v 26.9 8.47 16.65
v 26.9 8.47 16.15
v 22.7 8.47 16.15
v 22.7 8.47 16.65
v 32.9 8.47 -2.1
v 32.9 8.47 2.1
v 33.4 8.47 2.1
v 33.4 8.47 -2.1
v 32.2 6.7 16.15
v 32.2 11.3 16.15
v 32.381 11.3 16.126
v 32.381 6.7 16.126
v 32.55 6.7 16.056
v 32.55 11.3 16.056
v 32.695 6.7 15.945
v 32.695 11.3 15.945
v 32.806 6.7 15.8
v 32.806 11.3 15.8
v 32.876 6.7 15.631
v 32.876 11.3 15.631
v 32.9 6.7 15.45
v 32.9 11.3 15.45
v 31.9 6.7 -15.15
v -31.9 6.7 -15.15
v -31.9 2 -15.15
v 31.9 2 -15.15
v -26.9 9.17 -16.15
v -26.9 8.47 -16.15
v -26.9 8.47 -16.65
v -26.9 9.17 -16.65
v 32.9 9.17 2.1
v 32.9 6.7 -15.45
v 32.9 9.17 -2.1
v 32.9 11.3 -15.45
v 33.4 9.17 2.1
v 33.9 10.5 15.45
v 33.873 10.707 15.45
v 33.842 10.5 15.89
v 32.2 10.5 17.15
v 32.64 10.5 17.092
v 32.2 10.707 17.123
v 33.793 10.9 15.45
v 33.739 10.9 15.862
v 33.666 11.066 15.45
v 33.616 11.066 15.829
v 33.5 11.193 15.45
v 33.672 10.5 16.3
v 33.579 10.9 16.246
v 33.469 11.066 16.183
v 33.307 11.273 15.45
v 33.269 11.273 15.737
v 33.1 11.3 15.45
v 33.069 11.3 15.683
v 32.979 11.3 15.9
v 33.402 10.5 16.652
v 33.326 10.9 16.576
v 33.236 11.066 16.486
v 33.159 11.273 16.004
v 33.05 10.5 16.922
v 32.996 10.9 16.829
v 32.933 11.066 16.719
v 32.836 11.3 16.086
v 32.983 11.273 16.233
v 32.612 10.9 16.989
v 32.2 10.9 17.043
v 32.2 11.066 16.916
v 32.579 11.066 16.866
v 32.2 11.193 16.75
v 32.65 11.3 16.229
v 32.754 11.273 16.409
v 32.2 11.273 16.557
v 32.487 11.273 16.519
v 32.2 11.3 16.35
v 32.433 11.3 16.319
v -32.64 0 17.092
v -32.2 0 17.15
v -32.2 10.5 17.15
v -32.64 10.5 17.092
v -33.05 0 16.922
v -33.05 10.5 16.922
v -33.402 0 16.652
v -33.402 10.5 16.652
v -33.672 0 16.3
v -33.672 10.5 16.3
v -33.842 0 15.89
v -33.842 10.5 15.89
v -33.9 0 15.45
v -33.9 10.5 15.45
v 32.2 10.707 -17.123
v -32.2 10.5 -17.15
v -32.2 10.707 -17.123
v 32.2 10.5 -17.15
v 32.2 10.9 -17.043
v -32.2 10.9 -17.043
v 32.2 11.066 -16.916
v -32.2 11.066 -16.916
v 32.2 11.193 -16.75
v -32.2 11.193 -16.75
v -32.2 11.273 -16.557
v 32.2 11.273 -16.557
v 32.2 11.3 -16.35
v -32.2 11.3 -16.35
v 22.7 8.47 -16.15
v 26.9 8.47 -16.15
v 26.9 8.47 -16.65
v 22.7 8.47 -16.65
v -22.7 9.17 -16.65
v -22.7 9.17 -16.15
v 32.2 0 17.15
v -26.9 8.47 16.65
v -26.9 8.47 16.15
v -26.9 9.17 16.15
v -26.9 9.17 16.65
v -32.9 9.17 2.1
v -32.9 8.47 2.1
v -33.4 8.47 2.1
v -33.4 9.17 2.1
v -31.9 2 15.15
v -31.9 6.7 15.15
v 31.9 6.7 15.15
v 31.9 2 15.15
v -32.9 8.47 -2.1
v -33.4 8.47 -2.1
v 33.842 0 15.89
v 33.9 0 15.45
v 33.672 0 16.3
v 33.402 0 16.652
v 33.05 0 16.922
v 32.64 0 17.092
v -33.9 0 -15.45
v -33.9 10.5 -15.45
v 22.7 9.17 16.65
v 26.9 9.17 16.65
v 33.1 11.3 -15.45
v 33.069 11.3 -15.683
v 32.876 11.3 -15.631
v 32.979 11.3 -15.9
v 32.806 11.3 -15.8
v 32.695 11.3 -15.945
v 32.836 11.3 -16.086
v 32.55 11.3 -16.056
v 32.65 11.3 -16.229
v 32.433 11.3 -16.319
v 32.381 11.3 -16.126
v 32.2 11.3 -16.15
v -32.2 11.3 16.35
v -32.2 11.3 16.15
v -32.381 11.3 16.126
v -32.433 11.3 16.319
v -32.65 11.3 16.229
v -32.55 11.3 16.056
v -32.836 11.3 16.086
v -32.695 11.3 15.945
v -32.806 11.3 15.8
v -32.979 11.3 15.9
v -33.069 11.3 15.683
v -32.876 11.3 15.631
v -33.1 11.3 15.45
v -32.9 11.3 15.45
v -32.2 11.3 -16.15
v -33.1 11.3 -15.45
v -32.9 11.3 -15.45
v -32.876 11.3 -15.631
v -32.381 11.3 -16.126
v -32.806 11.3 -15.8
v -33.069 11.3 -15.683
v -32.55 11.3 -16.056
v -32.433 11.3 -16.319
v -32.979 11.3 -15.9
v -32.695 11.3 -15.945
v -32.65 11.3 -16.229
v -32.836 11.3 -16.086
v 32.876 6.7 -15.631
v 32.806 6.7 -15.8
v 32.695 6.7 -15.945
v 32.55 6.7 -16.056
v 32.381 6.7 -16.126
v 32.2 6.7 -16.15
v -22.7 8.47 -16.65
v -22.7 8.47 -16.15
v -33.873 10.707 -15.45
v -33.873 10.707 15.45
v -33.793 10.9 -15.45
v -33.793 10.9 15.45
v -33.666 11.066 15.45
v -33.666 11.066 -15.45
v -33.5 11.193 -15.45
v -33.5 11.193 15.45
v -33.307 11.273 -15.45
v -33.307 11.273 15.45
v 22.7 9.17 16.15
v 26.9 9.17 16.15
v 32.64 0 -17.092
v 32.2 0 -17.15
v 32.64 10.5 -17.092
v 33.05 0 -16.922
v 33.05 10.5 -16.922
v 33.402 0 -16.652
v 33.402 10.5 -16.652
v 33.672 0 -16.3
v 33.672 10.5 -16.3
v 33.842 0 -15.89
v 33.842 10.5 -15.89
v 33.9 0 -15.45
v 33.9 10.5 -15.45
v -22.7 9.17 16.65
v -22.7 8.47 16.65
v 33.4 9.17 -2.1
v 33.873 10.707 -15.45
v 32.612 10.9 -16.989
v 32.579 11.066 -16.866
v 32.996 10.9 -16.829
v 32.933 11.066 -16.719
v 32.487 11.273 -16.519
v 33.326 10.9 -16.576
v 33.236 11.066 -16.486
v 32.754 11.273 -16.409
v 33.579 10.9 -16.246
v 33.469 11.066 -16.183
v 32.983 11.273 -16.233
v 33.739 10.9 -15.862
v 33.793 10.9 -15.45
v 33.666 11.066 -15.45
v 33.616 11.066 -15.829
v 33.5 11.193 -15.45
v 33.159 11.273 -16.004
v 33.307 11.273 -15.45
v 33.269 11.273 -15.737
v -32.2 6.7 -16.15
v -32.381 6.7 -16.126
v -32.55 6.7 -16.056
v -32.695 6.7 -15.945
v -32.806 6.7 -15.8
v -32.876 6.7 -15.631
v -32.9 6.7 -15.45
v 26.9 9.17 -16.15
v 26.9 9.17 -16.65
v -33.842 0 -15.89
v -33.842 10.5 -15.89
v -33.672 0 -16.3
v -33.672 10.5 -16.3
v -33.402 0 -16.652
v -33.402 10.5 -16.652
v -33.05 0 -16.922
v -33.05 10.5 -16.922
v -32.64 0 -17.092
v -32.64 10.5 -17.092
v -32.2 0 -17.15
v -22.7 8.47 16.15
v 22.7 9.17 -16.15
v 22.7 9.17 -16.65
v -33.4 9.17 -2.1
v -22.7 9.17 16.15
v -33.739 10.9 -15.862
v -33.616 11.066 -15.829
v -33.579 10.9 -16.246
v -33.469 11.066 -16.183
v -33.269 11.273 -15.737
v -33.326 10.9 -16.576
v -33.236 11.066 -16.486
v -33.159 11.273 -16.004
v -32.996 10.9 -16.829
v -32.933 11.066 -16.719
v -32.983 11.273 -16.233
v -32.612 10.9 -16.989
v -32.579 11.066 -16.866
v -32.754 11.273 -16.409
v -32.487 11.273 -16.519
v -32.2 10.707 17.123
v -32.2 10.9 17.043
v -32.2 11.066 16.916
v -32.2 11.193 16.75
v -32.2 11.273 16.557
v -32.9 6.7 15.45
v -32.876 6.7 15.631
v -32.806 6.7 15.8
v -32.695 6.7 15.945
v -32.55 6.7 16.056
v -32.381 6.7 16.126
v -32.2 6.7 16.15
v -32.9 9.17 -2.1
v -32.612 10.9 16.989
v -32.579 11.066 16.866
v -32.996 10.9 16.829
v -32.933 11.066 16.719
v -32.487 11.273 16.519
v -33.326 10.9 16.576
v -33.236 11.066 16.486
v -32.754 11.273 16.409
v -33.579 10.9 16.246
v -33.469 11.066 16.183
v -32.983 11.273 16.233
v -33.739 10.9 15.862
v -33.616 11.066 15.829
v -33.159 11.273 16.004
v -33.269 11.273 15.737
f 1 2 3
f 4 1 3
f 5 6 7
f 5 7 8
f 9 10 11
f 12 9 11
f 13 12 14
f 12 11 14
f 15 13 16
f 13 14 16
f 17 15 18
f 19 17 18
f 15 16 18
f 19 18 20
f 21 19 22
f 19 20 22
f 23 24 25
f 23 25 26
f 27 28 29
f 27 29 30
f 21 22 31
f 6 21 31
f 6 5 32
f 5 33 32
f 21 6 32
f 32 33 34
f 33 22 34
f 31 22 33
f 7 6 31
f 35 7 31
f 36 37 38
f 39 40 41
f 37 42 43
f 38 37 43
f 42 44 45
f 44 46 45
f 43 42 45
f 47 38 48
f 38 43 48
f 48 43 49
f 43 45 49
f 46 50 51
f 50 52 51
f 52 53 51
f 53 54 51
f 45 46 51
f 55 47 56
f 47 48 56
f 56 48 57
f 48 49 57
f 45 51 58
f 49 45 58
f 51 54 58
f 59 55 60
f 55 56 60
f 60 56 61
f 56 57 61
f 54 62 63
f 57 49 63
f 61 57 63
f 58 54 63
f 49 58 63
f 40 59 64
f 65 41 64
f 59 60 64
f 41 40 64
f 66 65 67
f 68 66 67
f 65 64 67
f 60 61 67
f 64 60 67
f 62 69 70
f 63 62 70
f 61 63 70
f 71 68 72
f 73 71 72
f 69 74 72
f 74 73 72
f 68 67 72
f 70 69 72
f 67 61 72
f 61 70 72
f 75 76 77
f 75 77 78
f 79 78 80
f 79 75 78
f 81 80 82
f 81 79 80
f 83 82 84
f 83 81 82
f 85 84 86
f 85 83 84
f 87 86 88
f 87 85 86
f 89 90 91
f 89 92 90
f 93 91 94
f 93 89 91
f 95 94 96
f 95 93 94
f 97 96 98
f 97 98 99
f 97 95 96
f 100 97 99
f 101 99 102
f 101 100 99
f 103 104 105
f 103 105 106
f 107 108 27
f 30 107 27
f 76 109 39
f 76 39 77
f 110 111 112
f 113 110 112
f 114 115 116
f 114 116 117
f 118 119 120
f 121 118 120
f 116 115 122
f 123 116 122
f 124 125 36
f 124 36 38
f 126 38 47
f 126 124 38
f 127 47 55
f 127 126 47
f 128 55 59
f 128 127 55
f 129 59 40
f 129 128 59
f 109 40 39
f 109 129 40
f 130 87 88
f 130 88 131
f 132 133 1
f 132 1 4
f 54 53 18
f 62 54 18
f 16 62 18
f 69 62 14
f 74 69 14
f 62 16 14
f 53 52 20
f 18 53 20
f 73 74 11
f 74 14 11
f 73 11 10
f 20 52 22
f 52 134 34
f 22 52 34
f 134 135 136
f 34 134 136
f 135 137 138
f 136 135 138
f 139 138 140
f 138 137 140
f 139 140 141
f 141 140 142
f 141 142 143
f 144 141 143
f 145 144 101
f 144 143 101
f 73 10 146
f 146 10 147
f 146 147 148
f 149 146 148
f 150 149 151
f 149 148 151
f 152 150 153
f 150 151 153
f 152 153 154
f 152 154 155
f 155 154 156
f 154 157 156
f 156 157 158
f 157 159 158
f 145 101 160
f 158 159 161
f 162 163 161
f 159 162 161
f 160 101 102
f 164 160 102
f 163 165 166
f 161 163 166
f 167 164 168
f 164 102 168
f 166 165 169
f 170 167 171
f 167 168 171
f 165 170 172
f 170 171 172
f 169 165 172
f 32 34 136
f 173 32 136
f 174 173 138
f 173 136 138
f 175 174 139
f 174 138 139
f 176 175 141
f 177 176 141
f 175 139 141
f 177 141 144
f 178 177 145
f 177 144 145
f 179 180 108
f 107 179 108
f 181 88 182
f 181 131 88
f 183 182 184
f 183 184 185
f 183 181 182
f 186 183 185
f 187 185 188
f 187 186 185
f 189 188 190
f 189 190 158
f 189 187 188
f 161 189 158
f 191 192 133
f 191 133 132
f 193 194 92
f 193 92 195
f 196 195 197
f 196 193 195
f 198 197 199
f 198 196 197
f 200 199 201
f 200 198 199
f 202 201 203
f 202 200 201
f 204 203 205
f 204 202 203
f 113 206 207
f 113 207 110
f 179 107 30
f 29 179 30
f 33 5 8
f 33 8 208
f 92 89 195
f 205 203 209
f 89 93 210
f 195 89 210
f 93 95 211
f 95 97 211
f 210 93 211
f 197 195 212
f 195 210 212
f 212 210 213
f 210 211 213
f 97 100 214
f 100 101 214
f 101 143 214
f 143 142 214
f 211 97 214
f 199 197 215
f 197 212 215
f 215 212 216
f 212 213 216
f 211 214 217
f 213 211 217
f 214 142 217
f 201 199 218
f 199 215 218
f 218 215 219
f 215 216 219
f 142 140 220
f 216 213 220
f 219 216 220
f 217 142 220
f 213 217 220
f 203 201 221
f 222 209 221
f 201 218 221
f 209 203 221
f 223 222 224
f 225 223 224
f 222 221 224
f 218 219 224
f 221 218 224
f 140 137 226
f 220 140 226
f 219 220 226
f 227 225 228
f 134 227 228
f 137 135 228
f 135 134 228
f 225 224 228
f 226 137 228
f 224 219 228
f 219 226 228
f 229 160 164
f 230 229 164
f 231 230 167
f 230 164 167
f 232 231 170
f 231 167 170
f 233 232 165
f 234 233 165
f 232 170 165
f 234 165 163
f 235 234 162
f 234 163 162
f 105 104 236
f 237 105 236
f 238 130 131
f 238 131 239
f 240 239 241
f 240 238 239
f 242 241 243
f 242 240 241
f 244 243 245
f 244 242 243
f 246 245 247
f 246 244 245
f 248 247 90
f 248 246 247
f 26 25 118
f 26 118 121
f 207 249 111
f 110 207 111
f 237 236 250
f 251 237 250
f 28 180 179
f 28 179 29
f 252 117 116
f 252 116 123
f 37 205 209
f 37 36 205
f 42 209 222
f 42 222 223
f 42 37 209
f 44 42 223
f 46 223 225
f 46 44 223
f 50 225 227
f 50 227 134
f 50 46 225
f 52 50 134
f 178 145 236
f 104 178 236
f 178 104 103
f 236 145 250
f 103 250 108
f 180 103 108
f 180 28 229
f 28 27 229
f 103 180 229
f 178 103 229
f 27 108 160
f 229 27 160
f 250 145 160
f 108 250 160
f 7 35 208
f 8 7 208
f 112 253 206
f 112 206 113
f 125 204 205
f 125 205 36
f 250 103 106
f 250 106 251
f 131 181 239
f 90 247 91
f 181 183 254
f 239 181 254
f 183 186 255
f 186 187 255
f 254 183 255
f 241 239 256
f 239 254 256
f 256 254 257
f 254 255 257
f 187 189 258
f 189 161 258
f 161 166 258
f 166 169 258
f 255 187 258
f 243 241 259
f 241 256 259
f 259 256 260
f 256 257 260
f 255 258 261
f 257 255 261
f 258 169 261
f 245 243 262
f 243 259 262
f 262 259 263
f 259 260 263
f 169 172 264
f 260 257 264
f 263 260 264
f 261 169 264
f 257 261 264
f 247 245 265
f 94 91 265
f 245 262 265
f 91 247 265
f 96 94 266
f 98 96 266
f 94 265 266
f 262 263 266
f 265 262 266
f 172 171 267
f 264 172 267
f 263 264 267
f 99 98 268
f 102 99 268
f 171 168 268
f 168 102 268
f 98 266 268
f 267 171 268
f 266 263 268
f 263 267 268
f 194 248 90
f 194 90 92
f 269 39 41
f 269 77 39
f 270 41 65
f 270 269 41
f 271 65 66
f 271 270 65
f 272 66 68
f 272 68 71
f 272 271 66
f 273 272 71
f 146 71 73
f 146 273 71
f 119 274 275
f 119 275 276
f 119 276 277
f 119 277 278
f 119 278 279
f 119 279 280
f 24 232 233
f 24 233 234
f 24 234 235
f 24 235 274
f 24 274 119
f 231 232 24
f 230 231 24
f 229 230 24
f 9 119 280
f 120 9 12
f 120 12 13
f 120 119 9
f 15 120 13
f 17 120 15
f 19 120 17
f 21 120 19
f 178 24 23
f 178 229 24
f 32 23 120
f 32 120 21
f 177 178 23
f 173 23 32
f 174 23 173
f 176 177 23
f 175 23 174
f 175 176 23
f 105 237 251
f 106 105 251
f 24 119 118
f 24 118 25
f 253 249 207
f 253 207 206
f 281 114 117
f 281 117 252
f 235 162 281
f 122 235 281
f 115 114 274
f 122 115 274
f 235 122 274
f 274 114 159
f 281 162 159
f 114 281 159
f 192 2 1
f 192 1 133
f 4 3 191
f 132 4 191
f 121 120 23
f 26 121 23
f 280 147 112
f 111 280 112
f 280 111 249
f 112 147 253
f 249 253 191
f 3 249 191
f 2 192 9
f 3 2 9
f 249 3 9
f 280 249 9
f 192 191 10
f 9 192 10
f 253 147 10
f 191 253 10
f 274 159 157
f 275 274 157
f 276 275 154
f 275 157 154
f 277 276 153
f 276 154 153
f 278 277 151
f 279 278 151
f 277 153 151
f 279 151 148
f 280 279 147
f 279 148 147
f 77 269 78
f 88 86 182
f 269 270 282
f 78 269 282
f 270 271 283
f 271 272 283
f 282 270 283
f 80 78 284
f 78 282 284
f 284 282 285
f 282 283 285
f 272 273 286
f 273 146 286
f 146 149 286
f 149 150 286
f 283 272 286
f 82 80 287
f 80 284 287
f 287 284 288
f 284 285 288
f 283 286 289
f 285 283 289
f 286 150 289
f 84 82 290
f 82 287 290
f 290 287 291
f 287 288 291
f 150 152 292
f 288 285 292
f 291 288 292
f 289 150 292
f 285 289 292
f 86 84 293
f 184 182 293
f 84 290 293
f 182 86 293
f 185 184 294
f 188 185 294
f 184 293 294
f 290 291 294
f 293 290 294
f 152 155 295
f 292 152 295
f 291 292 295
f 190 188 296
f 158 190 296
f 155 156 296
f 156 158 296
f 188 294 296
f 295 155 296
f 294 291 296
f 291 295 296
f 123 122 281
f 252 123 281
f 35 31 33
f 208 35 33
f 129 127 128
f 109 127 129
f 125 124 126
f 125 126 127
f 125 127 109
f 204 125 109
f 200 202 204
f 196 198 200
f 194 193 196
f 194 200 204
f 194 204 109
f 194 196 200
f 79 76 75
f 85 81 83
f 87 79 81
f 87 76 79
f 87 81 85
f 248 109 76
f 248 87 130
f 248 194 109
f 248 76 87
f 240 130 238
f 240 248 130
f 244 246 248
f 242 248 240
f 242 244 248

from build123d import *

# Parameters (mm, degrees)
EXTRUDE_1_DEPTH     = 11.3
CUT_EXTRUDE_1_DEPTH = 4.6
SKETCH_3_W          = 63.8
SKETCH_3_H          = 30.3
CUT_EXTRUDE_2_DEPTH = 4.7
SKETCH_4_W          = 4.2
SKETCH_4_H          = 0.7
CUT_EXTRUDE_3_DEPTH = 0.5
SKETCH_5_W          = 4.2
SKETCH_5_H          = 0.7
CUT_EXTRUDE_4_DEPTH = 0.5
FILLET_4_R          = 0.8


with BuildPart() as part:
    # 草图1 → 凸台-拉伸1 (new body)
    with BuildSketch(Plane(origin=(0, 0, 0), x_dir=(1, 0, 0), z_dir=(0, 1, 0))):
        with BuildLine():
            Line((-32.2, 17.15), (32.2, 17.15))
            ThreePointArc((32.2, 17.15), (33.402081528, 16.652081528), (33.9, 15.45))
            Line((33.9, 15.45), (33.9, -15.45))
            ThreePointArc((33.9, -15.45), (33.402081528, -16.652081528), (32.2, -17.15))
            Line((32.2, -17.15), (-32.2, -17.15))
            ThreePointArc((-32.2, -17.15), (-33.402081528, -16.652081528), (-33.9, -15.45))
            Line((-33.9, -15.45), (-33.9, 15.45))
            ThreePointArc((-33.9, 15.45), (-33.402081528, 16.652081528), (-32.2, 17.15))
        make_face()
    extrude(amount=EXTRUDE_1_DEPTH)

    # 草图2 → 切除-拉伸1 (cut)
    with BuildSketch(Plane(origin=(0, 11.3, 0), x_dir=(1, 0, 0), z_dir=(0, 1, 0))):
        with BuildLine():
            Line((32.9, -15.45), (32.9, 15.45))
            ThreePointArc((32.9, 15.45), (32.694974747, 15.944974747), (32.2, 16.15))
            Line((32.2, 16.15), (-32.2, 16.15))
            ThreePointArc((-32.2, 16.15), (-32.694974747, 15.944974747), (-32.9, 15.45))
            Line((-32.9, 15.45), (-32.9, -15.45))
            ThreePointArc((-32.9, -15.45), (-32.694974747, -15.944974747), (-32.2, -16.15))
            Line((-32.2, -16.15), (32.2, -16.15))
            ThreePointArc((32.2, -16.15), (32.694974747, -15.944974747), (32.9, -15.45))
        make_face()
    extrude(amount=-CUT_EXTRUDE_1_DEPTH, mode=Mode.SUBTRACT)

    # 草图3 → 切除-拉伸2 (cut)
    with BuildSketch(Plane(origin=(0, 6.7, 0), x_dir=(1, 0, 0), z_dir=(0, 1, 0))):
        Rectangle(SKETCH_3_W, SKETCH_3_H)
    extrude(amount=-CUT_EXTRUDE_2_DEPTH, mode=Mode.SUBTRACT)

    # 草图4 → 切除-拉伸3 (cut)
    with BuildSketch(Plane(origin=(-32.9, 0, 0), x_dir=(0, 0, -1), z_dir=(1, 0, 0))):
        with Locations((0, 8.82)):
            Rectangle(SKETCH_4_W, SKETCH_4_H)
    cut_extrude_3 = extrude(amount=-CUT_EXTRUDE_3_DEPTH, mode=Mode.SUBTRACT)

    # 镜向1: 切除-拉伸3 across plane
    add(cut_extrude_3.mirror(Plane(origin=(0, 0, 0), x_dir=(0, 0, 1), z_dir=(1, 0, 0))), mode=Mode.SUBTRACT)

    # 草图5 → 切除-拉伸4 (cut)
    with BuildSketch(Plane(origin=(0, 0, 16.15), x_dir=(-1, 0, 0), z_dir=(0, 0, -1))):
        with Locations((-24.8, 8.82)):
            Rectangle(SKETCH_5_W, SKETCH_5_H)
        with Locations((24.8, 8.82)):
            Rectangle(SKETCH_5_W, SKETCH_5_H)
    cut_extrude_4 = extrude(amount=-CUT_EXTRUDE_4_DEPTH, mode=Mode.SUBTRACT)

    # 镜向2: 切除-拉伸4 across plane
    add(cut_extrude_4.mirror(Plane.XY), mode=Mode.SUBTRACT)

    # 圆角4
    fillet_4_edges = [part.edges().sort_by_distance(p)[0] for p in [
        (-33.402081528, 11.3, -16.652081528),
        (-33.9, 11.3, 0),
        (-33.402081528, 11.3, 16.652081528),
        (0, 11.3, 17.15),
        (33.402081528, 11.3, 16.652081528),
        (33.9, 11.3, 0),
        (33.402081528, 11.3, -16.652081528),
        (0, 11.3, -17.15),
    ]]
    fillet(fillet_4_edges, radius=FILLET_4_R)


solid = part.part
